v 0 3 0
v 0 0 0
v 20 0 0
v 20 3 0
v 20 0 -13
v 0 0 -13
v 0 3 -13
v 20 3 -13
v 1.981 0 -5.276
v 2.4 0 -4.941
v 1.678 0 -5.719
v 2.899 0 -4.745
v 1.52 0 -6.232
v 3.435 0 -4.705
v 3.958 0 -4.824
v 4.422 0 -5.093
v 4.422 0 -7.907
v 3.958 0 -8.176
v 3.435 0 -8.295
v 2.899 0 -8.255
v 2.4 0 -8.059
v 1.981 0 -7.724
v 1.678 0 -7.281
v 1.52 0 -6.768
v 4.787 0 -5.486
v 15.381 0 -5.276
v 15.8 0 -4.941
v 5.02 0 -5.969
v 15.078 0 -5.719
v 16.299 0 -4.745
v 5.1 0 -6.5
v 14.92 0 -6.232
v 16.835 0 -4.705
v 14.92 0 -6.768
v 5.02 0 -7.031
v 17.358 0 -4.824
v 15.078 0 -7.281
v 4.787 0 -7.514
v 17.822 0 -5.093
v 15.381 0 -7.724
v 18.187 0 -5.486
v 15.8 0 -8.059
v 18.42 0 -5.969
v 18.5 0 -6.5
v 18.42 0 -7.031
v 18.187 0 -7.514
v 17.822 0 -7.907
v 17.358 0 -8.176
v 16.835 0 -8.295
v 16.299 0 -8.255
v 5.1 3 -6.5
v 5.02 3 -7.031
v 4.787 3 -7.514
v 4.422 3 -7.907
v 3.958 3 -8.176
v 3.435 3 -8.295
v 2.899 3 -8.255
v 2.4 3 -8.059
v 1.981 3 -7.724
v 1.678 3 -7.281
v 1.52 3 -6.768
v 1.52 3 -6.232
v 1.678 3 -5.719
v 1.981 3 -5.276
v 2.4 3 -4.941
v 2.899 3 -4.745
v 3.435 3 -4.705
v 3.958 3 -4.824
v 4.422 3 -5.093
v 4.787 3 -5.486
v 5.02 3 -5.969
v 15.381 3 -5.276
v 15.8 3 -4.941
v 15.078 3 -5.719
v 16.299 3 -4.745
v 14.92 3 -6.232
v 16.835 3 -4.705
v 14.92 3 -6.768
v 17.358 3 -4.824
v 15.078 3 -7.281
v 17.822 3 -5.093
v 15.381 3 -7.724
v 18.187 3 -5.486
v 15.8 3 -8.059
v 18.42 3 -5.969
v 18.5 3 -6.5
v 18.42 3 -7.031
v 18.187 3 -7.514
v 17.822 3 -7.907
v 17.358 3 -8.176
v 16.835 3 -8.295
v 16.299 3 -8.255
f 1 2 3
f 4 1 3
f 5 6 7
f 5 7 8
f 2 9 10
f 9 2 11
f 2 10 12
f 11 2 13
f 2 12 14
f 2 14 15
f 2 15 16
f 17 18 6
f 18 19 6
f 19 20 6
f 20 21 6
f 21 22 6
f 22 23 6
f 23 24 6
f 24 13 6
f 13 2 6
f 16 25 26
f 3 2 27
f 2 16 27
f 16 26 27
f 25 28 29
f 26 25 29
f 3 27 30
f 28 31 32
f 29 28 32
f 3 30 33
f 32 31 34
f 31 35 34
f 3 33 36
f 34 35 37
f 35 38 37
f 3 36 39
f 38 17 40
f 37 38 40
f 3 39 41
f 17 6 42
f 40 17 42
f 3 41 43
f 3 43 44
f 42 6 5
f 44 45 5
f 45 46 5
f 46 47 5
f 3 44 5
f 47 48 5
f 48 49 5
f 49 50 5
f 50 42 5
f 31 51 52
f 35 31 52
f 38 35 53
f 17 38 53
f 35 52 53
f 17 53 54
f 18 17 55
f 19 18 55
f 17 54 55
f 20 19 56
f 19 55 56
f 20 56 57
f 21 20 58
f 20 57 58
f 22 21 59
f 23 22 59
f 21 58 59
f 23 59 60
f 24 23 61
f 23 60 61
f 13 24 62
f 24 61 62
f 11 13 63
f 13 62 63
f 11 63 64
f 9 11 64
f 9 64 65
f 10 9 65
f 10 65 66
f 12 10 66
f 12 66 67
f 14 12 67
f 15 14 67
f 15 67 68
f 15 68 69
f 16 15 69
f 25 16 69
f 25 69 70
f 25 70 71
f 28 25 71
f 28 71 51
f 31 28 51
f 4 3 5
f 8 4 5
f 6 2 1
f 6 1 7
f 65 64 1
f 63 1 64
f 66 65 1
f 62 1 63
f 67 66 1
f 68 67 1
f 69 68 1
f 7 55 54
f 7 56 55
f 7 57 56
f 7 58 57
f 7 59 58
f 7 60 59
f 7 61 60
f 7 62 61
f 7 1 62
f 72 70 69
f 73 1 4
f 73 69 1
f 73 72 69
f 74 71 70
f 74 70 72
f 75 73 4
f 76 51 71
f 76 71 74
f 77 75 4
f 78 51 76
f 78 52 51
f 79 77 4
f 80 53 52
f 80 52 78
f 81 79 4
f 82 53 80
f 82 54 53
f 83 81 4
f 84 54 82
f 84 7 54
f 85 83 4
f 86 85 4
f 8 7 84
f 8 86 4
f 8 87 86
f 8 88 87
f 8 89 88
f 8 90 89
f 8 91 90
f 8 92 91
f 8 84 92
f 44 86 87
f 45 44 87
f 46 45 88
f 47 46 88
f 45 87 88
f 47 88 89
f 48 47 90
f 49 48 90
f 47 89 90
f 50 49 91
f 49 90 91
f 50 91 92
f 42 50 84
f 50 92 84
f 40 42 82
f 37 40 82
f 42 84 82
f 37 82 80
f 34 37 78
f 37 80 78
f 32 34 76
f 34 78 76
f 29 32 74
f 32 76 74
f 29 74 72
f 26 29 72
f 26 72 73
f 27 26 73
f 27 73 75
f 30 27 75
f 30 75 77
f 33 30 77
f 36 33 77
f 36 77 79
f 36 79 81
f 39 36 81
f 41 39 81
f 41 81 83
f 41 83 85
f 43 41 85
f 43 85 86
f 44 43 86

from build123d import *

# Parameters (mm, degrees)
SKETCH1_W               = 20
SKETCH1_H               = 13
BOSS_EXTRUDE1_DEPTH     = 3
SKETCH2_R               = 1.8
CUT_EXTRUDE1_DEPTH      = 1
CUT_EXTRUDE1_DEPTH_BACK = 4


with BuildPart() as part:
    # Sketch1 → Boss-Extrude1 (new body)
    with BuildSketch(Plane(origin=(0, 0, 0), x_dir=(1, 0, 0), z_dir=(0, 1, 0))):
        with Locations((10, 6.5)):
            Rectangle(SKETCH1_W, SKETCH1_H)
    extrude(amount=BOSS_EXTRUDE1_DEPTH)

    # Sketch2 → Cut-Extrude1 (cut, two sides)
    with BuildSketch(Plane(origin=(0, 3, 0), x_dir=(1, 0, 0), z_dir=(0, 1, 0))) as cut_extrude1_sk:
        with Locations((3.3, 6.5)):
            Circle(SKETCH2_R)
        with Locations((16.7, 6.5)):
            Circle(SKETCH2_R)
    extrude(amount=CUT_EXTRUDE1_DEPTH, mode=Mode.SUBTRACT)
    extrude(cut_extrude1_sk.sketch, amount=-CUT_EXTRUDE1_DEPTH_BACK, mode=Mode.SUBTRACT)


solid = part.part
